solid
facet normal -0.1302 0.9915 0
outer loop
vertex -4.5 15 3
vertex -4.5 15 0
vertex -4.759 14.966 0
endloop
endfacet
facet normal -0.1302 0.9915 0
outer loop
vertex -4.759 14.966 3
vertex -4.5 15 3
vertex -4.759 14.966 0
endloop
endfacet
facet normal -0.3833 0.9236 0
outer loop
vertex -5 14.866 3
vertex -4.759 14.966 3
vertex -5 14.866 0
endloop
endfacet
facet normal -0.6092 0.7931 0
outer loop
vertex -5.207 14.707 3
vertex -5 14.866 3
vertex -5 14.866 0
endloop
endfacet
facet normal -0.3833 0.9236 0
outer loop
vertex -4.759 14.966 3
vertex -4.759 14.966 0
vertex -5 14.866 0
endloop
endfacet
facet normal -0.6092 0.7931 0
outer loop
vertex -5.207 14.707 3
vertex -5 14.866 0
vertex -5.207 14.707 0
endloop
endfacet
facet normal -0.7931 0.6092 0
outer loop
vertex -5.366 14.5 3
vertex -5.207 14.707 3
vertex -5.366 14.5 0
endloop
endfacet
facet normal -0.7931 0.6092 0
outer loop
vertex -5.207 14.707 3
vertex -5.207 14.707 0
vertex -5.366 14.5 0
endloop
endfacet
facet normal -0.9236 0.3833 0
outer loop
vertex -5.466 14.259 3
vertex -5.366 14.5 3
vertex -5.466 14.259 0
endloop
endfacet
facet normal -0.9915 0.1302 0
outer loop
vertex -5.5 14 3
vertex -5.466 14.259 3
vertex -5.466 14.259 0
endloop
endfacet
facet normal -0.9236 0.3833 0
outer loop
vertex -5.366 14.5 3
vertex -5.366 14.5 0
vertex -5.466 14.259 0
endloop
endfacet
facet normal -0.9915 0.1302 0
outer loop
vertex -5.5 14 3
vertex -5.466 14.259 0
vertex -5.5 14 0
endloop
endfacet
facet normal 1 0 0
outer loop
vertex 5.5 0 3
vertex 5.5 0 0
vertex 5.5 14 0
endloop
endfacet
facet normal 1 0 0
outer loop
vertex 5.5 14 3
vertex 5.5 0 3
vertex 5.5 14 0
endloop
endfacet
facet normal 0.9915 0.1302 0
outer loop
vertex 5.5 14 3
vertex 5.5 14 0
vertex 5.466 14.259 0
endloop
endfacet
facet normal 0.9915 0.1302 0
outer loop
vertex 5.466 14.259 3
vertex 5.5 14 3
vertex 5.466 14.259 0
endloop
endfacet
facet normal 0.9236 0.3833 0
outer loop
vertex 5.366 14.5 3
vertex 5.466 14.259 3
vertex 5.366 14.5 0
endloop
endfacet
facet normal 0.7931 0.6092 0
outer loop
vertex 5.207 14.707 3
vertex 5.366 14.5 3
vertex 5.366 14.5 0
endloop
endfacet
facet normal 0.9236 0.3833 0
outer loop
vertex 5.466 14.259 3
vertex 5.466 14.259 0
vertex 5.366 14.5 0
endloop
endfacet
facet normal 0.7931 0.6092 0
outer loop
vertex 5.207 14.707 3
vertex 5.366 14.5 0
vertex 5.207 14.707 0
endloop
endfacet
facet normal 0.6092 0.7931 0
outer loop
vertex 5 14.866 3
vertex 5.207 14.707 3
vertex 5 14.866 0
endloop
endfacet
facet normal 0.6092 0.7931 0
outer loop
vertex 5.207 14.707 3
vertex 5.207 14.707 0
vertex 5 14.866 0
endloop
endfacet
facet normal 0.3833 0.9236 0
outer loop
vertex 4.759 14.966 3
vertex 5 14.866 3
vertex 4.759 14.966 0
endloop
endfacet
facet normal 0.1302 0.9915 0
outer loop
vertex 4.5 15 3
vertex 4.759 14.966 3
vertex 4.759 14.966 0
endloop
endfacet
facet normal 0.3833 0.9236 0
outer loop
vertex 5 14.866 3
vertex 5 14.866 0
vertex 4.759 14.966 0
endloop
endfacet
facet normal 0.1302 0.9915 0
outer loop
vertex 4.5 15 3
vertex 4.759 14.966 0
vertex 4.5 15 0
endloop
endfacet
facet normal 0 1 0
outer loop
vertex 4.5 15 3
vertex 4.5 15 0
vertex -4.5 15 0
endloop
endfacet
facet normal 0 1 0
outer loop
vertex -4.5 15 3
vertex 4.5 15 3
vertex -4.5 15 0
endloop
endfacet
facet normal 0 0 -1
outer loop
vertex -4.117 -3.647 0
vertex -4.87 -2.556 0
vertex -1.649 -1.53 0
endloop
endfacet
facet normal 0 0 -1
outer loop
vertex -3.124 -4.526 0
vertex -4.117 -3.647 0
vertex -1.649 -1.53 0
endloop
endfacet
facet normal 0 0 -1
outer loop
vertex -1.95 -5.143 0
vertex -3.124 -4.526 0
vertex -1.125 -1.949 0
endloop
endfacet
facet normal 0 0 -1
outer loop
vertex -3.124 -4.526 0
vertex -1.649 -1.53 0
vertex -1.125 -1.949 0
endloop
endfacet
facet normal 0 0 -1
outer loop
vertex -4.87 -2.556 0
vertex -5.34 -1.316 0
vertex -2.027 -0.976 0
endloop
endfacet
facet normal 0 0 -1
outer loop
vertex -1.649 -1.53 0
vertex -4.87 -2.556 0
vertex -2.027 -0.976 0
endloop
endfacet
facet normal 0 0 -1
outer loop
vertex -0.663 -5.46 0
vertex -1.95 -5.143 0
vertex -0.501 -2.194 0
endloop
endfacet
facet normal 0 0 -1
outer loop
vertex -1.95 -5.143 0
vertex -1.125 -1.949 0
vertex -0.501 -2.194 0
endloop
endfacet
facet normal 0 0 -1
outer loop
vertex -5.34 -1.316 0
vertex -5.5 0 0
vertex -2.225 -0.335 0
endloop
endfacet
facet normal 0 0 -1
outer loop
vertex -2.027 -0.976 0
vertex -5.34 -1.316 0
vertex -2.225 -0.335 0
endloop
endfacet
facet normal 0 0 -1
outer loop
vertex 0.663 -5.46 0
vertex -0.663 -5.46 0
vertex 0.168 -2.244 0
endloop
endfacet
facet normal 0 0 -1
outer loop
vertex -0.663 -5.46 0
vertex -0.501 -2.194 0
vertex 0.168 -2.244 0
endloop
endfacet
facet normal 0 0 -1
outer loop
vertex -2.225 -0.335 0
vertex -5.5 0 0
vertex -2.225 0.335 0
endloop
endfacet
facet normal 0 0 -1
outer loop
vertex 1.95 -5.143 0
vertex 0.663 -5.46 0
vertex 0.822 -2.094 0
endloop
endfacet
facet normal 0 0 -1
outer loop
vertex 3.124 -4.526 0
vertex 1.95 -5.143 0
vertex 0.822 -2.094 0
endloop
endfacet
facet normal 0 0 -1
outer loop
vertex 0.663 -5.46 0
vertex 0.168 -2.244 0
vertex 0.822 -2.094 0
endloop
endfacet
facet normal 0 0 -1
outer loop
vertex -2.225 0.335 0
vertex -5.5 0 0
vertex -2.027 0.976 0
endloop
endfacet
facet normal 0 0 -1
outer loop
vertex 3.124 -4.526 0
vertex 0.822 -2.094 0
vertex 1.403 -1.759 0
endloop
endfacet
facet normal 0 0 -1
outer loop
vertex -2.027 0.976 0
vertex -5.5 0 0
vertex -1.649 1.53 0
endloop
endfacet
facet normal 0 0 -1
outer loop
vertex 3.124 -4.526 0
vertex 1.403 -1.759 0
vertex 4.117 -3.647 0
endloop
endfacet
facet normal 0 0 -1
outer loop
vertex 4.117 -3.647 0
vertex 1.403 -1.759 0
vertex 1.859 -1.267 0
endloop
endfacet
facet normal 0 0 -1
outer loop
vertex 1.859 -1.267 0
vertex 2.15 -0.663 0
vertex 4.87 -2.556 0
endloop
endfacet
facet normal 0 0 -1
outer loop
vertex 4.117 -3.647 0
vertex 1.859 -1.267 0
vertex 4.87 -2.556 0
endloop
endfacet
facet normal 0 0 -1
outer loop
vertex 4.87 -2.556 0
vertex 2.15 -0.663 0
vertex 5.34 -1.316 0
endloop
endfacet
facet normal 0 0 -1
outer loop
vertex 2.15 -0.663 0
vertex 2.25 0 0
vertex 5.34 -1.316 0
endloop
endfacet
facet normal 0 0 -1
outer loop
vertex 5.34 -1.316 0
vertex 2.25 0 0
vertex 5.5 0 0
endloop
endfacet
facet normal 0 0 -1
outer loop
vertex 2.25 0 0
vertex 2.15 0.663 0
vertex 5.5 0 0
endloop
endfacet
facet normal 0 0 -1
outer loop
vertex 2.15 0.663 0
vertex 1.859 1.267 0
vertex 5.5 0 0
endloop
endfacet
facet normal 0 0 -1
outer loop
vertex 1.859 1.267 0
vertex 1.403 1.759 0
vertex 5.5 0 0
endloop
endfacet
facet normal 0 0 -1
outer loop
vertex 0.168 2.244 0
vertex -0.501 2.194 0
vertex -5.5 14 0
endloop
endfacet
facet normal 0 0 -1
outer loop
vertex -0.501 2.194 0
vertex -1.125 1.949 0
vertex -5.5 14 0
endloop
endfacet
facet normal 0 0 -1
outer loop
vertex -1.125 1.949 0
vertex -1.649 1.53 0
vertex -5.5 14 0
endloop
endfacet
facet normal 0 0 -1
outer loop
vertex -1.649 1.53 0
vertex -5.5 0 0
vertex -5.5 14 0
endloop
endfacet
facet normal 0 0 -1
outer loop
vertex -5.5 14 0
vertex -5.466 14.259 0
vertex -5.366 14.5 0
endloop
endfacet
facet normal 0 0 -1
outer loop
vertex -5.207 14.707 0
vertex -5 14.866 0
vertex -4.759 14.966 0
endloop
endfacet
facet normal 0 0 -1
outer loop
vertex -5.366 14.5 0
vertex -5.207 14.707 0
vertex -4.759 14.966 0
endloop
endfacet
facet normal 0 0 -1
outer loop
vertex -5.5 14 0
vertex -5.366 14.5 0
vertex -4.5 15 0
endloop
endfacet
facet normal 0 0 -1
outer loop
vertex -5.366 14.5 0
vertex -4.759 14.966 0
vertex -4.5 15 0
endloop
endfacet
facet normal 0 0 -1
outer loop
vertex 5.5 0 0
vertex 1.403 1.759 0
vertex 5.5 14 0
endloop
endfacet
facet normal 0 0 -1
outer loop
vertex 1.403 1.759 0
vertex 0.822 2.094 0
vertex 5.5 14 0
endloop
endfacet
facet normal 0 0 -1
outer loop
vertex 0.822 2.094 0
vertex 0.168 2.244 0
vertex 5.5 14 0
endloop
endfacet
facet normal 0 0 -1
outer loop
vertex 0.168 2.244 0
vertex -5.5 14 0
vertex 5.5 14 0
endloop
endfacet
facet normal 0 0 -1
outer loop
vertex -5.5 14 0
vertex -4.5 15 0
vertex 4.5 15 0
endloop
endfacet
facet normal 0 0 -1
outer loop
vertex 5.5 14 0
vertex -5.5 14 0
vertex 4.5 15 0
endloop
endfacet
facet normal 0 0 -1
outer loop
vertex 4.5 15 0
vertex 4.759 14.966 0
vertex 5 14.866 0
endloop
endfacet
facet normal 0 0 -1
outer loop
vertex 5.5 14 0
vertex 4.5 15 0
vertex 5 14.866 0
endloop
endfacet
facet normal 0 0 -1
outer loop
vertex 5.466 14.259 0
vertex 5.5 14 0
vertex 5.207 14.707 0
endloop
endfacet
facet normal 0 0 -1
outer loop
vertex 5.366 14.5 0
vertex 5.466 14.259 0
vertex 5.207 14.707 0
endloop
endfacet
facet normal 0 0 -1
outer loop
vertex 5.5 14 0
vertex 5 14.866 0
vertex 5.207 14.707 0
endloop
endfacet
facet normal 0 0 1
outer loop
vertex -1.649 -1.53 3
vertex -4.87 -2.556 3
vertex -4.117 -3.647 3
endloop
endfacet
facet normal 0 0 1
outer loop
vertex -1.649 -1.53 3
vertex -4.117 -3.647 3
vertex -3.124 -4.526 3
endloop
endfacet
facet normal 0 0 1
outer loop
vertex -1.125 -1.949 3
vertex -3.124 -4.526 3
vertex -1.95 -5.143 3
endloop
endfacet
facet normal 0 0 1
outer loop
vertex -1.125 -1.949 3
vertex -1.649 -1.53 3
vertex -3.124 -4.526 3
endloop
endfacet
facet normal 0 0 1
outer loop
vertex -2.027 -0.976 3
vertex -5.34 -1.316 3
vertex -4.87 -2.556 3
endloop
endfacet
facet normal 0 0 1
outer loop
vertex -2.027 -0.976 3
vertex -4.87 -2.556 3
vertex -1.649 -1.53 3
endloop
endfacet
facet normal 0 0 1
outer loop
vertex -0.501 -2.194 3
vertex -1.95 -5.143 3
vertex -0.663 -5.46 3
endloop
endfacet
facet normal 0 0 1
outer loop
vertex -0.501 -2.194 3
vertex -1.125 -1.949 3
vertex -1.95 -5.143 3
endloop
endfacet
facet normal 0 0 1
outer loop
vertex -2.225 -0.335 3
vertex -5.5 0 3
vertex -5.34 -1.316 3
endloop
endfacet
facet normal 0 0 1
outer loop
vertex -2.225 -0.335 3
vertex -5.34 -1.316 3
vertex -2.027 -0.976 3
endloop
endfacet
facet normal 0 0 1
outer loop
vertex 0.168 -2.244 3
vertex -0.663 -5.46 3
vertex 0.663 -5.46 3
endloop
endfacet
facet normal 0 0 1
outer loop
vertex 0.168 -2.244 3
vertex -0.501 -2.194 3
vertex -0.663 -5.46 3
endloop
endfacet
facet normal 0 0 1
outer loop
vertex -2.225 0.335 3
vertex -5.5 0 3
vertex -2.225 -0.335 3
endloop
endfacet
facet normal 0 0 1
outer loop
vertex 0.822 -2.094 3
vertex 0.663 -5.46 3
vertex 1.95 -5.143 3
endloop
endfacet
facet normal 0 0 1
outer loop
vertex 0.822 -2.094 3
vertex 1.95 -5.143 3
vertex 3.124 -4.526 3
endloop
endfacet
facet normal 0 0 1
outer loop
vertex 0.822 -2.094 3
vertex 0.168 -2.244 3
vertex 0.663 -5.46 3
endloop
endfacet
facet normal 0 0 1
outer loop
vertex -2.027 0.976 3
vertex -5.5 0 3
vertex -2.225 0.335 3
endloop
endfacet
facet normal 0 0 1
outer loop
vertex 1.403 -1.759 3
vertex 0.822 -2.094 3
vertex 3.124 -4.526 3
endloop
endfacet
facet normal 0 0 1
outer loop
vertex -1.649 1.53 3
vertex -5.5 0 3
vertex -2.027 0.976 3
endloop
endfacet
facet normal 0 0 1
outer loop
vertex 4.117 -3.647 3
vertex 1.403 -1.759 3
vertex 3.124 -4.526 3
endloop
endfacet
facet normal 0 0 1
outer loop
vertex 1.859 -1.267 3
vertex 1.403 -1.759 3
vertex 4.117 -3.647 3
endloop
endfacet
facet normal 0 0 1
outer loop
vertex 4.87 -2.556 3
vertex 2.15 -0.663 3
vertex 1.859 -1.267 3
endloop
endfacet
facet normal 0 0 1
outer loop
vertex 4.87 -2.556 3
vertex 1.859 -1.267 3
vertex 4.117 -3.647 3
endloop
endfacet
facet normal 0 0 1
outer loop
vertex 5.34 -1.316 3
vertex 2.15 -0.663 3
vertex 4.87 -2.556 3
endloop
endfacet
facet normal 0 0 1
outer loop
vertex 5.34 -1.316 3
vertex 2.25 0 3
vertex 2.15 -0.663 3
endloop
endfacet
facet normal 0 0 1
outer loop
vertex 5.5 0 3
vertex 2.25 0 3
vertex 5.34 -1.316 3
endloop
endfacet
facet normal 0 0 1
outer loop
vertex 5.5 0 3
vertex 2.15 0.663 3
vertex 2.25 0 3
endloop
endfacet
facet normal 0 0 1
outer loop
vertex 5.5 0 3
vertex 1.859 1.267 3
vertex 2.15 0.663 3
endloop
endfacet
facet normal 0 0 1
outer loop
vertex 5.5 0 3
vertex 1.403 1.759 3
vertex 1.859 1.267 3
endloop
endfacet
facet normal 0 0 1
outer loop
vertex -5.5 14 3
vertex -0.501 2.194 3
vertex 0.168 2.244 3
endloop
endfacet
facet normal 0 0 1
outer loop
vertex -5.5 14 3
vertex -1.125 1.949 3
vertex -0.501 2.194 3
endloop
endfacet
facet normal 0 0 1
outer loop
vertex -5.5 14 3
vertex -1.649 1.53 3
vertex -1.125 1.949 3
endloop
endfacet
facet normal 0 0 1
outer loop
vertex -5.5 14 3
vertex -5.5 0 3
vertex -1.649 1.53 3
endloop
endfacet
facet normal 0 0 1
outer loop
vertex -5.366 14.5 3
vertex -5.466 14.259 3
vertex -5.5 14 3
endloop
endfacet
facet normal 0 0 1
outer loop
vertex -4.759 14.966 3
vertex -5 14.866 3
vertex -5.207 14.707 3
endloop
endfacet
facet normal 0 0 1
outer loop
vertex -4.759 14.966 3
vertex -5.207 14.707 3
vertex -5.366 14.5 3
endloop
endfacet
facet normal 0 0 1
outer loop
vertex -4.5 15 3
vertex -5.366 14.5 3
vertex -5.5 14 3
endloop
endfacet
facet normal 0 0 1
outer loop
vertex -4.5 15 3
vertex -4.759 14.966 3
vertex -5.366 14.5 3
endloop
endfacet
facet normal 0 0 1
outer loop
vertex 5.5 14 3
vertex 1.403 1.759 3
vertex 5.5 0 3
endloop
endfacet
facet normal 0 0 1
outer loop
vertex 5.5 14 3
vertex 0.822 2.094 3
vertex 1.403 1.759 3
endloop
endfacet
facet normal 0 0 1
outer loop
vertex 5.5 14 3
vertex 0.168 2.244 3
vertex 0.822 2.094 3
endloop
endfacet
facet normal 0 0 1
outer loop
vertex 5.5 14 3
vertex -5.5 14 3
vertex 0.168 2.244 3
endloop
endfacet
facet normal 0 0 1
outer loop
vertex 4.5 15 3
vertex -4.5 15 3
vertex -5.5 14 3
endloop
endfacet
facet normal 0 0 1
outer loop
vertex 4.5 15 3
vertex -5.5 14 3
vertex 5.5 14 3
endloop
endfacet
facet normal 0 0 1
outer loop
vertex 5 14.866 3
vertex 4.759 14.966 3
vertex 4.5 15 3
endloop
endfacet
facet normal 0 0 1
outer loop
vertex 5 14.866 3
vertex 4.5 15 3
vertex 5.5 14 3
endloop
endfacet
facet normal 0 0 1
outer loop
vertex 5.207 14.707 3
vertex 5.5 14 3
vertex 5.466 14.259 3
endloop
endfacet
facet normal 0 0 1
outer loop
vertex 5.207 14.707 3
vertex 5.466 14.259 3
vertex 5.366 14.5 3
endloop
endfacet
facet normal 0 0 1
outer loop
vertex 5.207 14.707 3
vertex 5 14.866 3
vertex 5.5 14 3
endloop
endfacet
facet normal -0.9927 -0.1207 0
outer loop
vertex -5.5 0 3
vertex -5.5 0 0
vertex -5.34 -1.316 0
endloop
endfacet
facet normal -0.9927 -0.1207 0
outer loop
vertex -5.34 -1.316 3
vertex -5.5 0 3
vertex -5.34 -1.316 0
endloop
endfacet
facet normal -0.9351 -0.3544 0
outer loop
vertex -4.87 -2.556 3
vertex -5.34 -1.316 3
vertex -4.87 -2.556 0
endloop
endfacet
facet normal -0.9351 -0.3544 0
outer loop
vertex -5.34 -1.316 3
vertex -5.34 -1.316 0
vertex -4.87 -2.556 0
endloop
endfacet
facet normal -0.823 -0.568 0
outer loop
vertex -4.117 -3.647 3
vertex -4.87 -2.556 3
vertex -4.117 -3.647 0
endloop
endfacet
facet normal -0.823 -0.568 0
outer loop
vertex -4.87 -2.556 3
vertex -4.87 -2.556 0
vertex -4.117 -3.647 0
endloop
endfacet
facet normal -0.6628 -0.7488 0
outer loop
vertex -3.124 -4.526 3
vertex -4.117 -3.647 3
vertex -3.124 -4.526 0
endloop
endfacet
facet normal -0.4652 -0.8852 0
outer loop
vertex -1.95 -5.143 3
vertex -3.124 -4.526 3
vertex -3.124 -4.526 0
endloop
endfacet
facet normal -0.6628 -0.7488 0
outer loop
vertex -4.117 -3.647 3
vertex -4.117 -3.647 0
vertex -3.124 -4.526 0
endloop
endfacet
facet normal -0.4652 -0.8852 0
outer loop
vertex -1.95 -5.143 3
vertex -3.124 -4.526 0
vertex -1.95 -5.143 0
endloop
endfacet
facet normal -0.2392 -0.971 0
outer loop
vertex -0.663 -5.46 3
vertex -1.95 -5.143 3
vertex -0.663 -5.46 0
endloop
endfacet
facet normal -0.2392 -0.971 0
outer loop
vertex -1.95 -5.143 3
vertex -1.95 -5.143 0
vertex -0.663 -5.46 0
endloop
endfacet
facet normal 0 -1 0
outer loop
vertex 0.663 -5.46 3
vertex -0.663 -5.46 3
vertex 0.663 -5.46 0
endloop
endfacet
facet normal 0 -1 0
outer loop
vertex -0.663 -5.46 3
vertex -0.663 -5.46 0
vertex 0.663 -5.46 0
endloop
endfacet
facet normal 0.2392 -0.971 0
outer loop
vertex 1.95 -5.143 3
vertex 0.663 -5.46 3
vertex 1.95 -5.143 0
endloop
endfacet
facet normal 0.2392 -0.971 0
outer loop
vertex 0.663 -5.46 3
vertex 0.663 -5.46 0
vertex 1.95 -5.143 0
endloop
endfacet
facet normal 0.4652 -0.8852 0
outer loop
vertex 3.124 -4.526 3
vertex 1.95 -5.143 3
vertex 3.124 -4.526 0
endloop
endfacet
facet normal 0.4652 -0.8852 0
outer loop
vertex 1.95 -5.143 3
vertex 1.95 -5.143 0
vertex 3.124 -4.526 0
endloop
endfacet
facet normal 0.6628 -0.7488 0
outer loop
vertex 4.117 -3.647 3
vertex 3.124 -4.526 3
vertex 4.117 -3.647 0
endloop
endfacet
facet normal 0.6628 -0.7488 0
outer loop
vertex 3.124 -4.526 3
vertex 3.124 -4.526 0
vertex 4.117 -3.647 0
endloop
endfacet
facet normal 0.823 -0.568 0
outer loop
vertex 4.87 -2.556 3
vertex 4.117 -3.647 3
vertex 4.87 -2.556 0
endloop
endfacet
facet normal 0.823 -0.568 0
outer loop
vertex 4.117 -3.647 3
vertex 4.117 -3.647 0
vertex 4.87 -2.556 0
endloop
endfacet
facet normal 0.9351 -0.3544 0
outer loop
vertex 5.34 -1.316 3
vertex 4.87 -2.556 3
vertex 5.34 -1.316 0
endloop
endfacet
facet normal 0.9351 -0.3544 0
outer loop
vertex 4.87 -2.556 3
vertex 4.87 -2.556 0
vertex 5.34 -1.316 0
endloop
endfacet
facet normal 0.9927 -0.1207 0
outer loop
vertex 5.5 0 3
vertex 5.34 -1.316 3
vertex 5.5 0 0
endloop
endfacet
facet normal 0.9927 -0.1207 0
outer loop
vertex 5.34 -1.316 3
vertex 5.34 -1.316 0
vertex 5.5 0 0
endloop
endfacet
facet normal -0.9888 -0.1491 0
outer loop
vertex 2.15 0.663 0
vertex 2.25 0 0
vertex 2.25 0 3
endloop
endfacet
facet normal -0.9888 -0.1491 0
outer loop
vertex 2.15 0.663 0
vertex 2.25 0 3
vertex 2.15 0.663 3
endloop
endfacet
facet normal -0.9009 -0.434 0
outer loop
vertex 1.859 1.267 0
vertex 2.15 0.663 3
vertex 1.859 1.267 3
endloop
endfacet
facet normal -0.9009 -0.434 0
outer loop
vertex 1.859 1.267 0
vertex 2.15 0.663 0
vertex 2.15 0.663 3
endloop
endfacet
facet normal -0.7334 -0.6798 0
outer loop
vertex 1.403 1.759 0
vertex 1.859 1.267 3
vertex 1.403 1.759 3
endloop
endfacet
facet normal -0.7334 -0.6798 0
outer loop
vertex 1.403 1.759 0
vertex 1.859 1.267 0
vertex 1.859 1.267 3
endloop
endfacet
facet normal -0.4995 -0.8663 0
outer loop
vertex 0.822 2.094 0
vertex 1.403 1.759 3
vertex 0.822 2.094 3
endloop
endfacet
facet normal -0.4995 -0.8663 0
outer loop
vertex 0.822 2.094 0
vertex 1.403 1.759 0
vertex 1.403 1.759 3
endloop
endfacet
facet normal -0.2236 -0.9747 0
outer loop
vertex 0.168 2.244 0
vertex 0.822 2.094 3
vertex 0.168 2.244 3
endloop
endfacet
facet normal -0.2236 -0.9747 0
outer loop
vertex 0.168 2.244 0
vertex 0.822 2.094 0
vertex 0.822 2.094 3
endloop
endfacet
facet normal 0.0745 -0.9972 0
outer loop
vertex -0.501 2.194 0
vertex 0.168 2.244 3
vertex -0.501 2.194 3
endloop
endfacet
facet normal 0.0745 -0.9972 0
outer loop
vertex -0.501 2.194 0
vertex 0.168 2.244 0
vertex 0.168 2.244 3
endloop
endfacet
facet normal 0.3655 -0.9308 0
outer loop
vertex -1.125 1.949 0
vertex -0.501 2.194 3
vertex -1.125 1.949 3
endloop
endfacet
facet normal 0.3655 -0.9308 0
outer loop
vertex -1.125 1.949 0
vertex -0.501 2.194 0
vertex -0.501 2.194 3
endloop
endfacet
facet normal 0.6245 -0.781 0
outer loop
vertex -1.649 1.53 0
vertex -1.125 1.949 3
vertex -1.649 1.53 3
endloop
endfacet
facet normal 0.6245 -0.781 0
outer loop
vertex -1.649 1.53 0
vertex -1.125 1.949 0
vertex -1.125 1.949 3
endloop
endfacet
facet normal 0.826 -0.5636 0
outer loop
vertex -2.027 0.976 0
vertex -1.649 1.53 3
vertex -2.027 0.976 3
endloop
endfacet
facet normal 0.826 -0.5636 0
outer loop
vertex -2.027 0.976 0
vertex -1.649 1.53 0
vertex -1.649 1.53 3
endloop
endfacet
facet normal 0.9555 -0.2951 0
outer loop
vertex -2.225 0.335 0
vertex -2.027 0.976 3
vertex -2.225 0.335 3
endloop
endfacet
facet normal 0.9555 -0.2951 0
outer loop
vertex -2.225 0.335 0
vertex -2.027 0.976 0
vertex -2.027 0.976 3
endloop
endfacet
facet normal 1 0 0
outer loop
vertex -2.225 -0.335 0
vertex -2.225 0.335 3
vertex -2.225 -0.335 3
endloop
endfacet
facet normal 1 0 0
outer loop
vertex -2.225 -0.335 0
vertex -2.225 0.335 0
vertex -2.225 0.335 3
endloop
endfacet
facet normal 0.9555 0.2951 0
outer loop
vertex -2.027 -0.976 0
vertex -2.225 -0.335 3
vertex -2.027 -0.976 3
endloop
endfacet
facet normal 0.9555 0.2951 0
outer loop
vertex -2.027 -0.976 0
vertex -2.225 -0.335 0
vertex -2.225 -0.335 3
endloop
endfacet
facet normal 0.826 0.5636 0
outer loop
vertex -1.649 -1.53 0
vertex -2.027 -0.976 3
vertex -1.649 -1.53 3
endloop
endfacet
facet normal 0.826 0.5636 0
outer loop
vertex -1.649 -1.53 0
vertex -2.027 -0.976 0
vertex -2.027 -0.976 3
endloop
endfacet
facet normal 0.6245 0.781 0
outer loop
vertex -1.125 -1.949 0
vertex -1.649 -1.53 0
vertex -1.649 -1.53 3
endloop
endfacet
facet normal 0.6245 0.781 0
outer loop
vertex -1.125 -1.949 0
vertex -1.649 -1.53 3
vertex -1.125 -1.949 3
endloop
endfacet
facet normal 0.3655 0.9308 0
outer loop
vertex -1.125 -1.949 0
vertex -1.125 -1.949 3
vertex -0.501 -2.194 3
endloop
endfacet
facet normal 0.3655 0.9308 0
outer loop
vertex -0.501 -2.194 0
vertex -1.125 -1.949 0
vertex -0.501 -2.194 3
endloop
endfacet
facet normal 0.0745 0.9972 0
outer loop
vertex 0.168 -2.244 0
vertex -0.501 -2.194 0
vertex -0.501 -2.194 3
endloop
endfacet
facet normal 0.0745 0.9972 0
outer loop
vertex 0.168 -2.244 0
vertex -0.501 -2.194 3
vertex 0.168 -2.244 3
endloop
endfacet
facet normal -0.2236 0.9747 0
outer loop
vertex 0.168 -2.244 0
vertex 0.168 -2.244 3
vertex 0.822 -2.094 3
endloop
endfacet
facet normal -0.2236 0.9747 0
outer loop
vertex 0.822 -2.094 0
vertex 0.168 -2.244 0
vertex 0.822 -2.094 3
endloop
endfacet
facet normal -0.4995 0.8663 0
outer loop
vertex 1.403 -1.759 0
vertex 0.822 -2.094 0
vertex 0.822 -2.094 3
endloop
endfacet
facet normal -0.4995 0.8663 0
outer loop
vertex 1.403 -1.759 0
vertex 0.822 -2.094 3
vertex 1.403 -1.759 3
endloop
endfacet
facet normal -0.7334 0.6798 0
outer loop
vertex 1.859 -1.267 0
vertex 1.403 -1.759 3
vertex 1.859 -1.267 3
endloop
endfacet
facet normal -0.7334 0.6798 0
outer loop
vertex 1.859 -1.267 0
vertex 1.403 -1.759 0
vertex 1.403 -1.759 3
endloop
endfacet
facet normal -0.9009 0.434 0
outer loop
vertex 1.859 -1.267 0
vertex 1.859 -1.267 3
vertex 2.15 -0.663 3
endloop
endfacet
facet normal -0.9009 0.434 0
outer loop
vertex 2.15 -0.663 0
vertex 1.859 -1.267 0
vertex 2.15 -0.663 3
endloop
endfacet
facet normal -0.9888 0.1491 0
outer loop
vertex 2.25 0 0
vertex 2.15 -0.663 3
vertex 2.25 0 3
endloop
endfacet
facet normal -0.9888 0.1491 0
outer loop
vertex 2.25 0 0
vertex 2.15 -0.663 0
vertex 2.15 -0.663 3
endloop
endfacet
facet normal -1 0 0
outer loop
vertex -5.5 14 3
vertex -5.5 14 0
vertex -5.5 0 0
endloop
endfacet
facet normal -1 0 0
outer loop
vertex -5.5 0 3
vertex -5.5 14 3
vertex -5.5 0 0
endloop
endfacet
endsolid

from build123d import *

# Parameters (mm, degrees)
F0_R     = 2.25
F1_DEPTH = 3


with BuildPart() as f1:
    # F0 (on Top) → F1 (new body)
    with BuildSketch(Plane.XY):
        with BuildLine():
            Line((-5.5, 14), (-5.5, 0))
            ThreePointArc((-5.5, 0), (0, -5.5), (5.5, 0))
            Line((5.5, 0), (5.5, 14))
            ThreePointArc((5.5, 14), (5.207107, 14.707107), (4.5, 15))
            Line((4.5, 15), (-4.5, 15))
            ThreePointArc((-4.5, 15), (-5.207107, 14.707107), (-5.5, 14))
        make_face()
        Circle(F0_R, mode=Mode.SUBTRACT)
    extrude(amount=F1_DEPTH)


solid = f1.part
